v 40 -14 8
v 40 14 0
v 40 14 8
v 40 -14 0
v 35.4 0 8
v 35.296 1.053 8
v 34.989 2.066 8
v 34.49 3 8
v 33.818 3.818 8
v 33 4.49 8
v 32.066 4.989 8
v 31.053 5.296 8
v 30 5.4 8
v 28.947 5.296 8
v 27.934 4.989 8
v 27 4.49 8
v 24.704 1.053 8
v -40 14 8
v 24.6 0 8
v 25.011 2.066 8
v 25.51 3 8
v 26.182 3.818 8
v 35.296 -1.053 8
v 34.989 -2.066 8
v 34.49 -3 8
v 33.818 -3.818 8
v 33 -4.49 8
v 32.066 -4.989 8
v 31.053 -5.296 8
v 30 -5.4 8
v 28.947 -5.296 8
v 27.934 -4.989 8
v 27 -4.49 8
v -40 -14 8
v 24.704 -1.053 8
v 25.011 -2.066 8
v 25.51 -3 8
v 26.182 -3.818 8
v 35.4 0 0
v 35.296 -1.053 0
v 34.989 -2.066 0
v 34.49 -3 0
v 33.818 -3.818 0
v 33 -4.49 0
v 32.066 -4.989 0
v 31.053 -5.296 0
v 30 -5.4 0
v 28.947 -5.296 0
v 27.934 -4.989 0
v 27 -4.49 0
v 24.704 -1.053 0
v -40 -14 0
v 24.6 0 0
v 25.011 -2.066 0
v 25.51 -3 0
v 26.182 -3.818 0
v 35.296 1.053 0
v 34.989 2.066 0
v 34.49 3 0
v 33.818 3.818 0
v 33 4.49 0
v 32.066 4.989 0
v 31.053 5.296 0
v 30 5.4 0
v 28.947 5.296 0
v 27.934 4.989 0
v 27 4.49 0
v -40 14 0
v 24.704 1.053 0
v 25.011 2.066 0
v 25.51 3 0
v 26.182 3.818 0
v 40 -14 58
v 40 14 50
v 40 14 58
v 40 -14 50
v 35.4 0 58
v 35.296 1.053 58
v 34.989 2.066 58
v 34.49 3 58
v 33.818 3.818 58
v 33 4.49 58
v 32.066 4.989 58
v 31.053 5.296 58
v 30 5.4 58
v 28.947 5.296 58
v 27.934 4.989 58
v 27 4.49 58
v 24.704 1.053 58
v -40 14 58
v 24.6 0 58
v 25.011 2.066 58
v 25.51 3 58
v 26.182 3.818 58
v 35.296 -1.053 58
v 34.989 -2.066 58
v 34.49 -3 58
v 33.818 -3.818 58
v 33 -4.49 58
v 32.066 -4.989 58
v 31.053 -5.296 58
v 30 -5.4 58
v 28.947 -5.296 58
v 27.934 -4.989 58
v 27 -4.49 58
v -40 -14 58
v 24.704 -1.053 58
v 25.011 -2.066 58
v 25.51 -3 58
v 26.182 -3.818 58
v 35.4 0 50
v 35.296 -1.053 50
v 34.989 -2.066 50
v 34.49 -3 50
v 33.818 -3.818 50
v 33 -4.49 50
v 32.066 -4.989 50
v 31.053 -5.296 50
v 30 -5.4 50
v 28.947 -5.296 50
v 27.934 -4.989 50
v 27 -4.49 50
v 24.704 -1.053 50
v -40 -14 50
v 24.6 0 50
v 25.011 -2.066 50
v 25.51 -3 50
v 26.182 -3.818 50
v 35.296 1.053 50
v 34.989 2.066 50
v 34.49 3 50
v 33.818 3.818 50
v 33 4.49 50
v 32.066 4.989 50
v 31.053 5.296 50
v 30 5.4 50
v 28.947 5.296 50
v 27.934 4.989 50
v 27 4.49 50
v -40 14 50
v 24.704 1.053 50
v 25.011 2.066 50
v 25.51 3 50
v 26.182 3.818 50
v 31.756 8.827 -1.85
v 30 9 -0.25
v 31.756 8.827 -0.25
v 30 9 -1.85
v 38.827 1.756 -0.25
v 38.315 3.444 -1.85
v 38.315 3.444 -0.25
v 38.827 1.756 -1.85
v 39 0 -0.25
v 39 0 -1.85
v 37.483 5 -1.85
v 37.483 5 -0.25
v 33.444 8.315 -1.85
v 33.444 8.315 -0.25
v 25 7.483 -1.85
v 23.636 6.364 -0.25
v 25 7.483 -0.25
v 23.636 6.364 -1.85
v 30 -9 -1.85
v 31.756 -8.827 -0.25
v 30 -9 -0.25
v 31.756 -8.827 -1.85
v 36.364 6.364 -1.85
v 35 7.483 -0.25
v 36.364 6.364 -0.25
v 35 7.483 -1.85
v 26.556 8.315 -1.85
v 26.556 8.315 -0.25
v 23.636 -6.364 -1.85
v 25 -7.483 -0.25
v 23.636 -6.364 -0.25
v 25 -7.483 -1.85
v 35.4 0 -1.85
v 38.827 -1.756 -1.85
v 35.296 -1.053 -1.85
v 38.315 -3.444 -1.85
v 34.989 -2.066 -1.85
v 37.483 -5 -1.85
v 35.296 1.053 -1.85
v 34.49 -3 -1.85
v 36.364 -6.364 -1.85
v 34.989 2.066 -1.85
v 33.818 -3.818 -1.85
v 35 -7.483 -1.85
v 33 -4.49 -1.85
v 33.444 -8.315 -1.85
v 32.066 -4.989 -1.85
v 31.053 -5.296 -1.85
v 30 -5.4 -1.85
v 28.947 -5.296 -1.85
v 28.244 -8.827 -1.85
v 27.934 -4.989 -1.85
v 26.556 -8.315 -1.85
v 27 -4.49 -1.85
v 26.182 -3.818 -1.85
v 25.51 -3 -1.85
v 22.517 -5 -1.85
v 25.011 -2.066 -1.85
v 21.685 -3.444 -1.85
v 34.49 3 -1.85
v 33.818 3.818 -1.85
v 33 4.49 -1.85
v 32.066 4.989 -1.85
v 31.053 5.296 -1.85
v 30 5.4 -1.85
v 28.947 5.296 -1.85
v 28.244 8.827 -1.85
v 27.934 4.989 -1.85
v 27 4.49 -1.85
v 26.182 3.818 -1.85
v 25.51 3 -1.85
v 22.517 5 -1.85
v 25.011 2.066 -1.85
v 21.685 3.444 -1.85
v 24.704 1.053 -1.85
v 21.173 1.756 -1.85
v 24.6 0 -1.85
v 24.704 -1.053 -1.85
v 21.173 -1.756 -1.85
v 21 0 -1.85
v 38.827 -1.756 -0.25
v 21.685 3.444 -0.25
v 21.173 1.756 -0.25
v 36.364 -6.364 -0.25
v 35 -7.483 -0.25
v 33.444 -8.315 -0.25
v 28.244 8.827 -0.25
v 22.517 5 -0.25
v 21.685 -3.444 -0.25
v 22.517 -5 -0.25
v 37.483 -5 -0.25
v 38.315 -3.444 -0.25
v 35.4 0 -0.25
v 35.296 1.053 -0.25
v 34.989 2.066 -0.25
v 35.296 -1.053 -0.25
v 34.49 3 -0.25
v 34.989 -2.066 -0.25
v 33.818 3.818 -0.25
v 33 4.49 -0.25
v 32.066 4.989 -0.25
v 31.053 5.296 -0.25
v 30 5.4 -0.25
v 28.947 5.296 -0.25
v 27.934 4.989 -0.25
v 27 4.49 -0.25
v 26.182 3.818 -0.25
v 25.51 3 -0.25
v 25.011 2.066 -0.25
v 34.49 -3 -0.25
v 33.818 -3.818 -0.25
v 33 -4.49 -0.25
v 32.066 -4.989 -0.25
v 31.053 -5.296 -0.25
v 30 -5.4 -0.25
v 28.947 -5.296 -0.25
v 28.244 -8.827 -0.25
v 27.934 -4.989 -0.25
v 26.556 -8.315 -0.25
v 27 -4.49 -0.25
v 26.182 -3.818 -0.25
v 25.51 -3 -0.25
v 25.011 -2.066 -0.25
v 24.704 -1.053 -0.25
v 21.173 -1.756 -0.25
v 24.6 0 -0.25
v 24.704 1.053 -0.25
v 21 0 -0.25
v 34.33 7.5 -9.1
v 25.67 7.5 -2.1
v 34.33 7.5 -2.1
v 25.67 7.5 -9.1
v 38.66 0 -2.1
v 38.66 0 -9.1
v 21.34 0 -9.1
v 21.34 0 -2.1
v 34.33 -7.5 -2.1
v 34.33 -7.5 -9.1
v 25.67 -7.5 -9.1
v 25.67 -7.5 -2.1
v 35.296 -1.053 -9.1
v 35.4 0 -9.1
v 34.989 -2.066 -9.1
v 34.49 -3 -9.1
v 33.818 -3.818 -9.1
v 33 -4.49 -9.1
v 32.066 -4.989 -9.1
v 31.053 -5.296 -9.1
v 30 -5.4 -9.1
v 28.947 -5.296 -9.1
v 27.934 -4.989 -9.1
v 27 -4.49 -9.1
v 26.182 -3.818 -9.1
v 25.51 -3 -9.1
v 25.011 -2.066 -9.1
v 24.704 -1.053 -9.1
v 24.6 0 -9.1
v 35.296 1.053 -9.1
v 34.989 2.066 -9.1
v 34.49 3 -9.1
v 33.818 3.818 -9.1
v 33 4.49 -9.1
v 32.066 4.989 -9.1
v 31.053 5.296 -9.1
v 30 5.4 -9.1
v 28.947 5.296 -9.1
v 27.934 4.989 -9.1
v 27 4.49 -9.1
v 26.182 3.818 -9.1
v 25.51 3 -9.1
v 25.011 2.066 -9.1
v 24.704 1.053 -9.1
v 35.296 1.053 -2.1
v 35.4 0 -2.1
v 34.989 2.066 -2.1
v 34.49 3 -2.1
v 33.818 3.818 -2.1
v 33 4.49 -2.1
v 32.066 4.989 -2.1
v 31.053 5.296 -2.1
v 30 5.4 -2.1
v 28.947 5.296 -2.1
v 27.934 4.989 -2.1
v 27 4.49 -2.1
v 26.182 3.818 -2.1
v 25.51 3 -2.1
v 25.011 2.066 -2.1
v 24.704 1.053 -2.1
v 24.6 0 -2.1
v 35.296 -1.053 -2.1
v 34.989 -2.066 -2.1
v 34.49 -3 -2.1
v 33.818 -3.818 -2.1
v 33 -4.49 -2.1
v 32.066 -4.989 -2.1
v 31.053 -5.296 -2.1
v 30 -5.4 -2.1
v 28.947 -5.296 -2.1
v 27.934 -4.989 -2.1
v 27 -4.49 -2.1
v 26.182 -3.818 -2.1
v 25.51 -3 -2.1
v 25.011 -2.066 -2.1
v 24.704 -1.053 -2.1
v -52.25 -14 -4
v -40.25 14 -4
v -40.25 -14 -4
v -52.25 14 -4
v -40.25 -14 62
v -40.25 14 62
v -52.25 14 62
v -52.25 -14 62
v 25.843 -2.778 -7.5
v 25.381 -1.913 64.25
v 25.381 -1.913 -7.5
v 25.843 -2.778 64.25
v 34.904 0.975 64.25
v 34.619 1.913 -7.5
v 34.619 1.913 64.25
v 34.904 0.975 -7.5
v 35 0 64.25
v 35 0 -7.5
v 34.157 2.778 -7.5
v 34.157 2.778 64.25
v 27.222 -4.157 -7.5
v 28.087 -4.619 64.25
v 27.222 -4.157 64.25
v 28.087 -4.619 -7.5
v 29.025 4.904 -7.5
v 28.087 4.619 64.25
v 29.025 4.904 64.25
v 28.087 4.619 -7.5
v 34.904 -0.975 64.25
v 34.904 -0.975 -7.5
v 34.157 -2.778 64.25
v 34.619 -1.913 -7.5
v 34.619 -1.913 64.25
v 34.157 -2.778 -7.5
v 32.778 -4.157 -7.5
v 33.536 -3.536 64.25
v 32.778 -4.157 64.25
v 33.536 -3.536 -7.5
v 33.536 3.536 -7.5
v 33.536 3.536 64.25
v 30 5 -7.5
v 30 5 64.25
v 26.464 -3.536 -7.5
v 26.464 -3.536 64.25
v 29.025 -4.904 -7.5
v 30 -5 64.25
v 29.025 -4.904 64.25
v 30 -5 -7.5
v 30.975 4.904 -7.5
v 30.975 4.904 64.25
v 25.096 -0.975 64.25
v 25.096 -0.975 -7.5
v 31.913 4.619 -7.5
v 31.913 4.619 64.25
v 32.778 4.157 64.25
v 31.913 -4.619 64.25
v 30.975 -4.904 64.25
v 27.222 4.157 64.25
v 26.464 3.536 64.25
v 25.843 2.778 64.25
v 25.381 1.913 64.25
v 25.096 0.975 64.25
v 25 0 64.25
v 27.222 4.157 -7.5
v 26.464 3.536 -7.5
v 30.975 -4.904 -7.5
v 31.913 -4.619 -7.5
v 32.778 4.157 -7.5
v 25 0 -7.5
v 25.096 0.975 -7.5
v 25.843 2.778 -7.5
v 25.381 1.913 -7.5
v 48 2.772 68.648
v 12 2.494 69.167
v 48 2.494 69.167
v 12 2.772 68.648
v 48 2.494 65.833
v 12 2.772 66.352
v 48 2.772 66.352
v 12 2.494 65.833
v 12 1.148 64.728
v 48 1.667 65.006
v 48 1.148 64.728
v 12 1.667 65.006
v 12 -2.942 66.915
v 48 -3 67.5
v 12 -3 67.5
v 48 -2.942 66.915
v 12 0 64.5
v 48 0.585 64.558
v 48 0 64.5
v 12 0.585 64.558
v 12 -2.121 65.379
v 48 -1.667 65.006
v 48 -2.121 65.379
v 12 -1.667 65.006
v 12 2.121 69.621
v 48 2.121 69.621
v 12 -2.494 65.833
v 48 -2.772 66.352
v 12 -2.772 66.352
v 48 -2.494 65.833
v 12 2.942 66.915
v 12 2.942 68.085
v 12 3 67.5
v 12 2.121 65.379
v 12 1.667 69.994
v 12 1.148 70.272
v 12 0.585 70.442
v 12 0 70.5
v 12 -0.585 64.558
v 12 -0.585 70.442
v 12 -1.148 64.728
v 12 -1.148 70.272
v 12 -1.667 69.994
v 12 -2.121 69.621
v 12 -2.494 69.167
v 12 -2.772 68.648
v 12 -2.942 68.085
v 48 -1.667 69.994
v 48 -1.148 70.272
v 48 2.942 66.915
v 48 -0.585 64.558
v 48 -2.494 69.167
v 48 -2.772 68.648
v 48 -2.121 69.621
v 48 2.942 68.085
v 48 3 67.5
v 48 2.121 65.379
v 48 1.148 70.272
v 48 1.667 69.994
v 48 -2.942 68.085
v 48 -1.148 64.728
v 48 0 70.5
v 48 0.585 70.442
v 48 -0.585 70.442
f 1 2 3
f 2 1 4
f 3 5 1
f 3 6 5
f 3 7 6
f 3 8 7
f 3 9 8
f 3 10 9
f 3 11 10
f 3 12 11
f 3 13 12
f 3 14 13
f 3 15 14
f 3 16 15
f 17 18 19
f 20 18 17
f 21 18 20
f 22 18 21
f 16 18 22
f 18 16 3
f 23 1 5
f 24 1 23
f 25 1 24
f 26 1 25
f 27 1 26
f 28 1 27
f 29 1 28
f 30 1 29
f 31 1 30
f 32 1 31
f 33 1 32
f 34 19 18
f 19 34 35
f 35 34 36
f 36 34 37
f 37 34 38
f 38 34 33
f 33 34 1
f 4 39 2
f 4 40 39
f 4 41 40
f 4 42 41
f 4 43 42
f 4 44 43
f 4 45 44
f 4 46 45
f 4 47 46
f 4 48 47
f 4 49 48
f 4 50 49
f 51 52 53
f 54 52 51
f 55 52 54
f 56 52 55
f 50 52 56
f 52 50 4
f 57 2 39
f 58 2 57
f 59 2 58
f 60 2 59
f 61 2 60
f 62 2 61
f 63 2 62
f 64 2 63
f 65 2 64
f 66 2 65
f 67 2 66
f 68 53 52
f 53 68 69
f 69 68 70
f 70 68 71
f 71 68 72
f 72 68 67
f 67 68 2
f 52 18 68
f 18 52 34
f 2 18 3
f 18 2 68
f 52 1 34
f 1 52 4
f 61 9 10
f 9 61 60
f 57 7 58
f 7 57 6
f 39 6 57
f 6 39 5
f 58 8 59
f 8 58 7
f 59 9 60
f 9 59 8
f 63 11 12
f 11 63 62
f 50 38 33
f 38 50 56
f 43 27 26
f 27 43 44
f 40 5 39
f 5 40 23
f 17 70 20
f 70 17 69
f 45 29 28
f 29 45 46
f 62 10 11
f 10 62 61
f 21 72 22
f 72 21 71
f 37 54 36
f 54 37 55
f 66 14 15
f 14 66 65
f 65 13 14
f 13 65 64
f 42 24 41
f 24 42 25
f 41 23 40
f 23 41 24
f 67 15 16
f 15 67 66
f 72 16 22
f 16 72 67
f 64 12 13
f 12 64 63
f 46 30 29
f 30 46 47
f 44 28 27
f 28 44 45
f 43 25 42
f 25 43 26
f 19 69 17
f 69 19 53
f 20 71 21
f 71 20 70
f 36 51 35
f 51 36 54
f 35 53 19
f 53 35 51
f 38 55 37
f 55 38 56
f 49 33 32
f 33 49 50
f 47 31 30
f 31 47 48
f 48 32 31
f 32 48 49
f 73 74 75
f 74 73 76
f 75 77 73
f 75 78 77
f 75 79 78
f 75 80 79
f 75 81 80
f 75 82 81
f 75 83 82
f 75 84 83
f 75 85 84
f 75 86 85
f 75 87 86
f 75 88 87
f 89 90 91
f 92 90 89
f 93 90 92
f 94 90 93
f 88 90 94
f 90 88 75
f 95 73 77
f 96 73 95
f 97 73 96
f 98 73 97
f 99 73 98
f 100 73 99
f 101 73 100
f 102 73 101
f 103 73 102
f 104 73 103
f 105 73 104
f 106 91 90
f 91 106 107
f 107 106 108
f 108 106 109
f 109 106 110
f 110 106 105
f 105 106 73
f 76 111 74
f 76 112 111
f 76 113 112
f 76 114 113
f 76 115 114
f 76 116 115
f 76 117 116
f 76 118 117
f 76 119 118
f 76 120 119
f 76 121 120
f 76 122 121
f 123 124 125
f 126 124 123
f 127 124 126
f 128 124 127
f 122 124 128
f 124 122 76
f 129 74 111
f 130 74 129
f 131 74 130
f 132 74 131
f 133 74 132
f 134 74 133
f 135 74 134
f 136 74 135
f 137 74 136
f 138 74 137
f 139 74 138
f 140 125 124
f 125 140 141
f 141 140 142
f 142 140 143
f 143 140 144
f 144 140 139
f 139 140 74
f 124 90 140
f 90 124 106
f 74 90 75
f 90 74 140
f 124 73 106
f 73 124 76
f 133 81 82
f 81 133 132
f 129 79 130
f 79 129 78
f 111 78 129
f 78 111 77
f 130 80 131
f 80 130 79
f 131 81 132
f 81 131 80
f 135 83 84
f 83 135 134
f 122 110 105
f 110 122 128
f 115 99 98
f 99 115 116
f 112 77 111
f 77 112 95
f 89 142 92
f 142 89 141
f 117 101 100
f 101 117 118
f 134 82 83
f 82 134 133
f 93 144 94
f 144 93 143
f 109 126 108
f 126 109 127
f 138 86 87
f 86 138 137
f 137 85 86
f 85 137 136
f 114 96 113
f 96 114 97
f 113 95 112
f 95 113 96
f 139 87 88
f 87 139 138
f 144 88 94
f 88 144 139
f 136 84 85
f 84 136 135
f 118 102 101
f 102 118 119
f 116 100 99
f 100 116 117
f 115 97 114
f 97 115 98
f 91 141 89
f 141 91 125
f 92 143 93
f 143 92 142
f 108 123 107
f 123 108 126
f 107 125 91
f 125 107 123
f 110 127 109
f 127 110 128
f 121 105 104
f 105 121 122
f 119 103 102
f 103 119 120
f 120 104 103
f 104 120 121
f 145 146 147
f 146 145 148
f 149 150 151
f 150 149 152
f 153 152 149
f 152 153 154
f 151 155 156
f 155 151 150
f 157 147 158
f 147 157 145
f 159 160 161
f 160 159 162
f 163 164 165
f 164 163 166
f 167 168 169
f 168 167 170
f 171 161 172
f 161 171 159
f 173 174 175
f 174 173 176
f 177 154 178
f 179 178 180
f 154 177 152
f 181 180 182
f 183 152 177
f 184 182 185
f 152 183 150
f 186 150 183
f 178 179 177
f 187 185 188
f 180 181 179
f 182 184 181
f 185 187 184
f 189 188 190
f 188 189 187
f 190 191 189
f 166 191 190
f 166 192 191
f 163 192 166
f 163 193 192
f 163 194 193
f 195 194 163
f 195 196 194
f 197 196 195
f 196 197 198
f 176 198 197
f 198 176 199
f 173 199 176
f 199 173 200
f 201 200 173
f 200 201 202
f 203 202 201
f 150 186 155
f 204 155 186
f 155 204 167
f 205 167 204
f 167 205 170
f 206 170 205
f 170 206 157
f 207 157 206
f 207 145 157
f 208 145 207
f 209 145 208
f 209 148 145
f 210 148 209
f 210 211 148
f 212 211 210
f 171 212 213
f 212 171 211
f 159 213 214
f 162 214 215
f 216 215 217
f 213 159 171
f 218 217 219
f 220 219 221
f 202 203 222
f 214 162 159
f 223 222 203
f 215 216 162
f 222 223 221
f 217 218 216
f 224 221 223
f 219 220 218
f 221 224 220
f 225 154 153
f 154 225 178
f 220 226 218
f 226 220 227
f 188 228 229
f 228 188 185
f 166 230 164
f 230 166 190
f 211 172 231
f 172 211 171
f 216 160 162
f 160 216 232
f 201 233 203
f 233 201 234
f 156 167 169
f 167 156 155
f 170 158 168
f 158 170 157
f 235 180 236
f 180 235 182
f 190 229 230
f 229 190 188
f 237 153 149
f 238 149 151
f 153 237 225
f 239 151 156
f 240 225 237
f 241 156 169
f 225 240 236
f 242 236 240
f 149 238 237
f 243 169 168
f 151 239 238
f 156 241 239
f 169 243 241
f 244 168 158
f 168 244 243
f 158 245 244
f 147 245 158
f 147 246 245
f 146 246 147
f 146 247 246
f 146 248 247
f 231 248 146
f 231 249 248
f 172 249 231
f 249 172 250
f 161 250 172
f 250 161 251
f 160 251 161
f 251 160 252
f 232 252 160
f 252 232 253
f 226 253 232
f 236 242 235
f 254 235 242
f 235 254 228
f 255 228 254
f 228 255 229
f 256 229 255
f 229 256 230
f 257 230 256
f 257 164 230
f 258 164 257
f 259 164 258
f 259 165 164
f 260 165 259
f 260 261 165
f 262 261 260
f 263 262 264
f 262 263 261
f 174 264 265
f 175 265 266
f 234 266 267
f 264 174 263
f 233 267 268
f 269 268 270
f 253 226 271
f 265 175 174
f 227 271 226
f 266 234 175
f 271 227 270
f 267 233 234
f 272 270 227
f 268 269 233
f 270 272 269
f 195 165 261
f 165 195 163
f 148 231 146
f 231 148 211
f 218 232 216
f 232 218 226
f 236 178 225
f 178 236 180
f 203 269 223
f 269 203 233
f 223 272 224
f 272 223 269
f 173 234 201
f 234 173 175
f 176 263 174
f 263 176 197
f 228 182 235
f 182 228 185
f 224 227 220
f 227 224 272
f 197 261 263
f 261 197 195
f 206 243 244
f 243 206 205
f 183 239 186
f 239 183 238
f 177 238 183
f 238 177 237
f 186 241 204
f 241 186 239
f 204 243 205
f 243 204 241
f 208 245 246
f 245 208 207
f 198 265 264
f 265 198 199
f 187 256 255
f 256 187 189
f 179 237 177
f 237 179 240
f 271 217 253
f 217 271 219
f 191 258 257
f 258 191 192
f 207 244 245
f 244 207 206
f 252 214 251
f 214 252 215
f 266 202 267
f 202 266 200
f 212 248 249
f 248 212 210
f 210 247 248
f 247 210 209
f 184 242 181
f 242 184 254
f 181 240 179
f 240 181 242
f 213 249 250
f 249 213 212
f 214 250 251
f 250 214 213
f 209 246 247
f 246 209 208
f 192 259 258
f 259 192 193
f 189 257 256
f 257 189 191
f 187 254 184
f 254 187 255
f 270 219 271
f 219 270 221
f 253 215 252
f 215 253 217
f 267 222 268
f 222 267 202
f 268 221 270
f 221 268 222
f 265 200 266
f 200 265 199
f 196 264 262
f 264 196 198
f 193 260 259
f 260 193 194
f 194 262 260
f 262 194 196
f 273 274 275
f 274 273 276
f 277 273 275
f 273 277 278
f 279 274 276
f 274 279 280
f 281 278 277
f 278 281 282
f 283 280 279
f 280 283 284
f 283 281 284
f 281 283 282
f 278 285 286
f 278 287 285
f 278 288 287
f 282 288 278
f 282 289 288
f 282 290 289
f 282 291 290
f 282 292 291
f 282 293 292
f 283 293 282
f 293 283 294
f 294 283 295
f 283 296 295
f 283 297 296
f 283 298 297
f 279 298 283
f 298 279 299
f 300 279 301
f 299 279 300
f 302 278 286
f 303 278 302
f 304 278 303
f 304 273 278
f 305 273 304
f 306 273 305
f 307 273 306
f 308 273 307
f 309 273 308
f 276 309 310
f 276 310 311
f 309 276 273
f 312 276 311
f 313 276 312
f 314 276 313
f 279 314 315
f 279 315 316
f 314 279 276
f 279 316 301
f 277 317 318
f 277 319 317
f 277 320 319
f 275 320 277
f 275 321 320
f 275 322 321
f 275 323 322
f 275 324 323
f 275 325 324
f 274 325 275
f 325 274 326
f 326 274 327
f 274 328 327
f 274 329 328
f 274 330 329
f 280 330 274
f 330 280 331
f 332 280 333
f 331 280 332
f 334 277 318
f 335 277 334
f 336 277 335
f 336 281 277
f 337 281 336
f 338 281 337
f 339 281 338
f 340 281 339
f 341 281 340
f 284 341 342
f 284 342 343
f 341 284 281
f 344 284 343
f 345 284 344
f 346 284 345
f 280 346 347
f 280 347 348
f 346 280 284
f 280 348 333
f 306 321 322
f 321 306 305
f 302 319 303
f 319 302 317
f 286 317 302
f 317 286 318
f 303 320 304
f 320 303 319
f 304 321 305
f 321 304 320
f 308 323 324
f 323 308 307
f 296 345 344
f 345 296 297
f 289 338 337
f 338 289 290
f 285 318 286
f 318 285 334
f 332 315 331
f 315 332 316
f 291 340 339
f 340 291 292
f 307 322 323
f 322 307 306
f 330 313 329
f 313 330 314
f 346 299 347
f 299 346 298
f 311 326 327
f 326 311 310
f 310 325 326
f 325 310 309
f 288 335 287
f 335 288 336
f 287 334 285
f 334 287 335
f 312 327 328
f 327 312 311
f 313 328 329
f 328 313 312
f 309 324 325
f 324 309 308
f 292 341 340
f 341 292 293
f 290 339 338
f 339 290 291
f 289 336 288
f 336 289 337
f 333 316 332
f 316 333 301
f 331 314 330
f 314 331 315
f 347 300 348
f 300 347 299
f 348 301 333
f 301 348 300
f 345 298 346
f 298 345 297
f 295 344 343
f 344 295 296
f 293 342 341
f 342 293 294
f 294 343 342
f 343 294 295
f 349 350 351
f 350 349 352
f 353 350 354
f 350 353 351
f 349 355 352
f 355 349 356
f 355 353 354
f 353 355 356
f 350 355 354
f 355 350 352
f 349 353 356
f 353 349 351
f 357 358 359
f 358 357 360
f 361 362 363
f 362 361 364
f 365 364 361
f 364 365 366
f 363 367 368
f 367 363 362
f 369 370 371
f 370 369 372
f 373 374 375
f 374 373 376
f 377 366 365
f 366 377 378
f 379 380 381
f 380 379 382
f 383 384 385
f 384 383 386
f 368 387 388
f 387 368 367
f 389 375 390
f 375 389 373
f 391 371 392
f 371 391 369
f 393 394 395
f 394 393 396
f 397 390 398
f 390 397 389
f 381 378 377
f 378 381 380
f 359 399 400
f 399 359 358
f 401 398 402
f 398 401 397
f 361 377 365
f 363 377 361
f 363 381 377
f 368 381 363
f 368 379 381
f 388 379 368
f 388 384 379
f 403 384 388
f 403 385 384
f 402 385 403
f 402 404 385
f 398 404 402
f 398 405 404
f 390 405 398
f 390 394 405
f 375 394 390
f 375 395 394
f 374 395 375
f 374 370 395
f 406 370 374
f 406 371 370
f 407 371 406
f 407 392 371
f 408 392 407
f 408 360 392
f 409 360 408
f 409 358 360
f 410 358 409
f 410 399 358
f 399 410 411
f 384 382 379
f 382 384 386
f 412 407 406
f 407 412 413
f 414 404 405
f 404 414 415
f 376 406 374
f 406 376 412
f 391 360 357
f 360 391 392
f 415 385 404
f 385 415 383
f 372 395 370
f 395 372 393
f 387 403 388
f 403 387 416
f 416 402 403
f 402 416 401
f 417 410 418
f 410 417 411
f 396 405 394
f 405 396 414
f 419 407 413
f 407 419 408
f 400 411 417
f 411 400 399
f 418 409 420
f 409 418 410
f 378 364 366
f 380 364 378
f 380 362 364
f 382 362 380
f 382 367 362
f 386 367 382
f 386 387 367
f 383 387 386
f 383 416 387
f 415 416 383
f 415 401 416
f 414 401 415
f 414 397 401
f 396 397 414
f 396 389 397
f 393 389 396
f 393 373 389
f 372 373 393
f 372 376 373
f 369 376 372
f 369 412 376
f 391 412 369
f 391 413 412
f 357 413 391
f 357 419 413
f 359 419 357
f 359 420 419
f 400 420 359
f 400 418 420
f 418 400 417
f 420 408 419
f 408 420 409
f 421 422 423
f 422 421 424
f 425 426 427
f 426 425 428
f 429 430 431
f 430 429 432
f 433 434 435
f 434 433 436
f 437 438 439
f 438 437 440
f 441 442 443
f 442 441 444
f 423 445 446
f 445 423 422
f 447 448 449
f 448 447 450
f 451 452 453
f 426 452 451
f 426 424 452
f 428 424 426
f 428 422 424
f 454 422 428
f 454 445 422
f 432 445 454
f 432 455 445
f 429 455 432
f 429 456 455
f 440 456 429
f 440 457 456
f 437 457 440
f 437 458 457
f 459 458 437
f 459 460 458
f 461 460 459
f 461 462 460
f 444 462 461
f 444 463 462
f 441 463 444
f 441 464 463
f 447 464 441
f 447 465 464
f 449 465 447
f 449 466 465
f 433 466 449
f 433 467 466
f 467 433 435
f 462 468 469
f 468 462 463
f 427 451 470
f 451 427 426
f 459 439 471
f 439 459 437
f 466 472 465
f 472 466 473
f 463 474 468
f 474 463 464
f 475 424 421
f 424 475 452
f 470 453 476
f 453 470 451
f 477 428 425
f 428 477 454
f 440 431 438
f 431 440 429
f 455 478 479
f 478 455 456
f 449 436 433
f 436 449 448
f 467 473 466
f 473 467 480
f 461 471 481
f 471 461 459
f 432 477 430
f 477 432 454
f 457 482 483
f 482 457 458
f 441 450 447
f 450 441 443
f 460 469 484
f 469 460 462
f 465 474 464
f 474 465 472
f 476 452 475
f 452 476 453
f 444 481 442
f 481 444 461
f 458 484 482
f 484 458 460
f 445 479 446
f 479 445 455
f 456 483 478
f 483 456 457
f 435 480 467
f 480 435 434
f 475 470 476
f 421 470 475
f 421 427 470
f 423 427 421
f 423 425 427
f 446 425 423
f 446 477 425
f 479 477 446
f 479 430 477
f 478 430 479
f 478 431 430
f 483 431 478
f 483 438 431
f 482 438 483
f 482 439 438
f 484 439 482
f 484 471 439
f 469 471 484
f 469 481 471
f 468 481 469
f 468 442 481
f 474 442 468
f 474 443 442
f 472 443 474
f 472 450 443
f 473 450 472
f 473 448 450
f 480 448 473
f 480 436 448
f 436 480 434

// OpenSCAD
$fn = 32;

// ------------------------------------------------------------------------
// C clamp: throat 50 mm, screw d10
// Every part is its own module, assembly() places every instance.
// ------------------------------------------------------------------------

// --- part 1 ---
module clamp_arm() {
  difference() {
    translate([-40, -14, 0]) cube([80, 28, 8]);
    translate([30, 0, -1]) cylinder(h = 10, d = 10.8);
  }
}

// --- part 2 ---
module clamp_spine() {
  difference() {
    translate([-33, -14, 0]) cube([66, 28, 12]);
  }
}

// --- part 3 ---
module clamp_screw() {
  translate([0, 0, -35.875]) cylinder(h = 71.75, d = 10);
}

// --- part 4 ---
module clamp_washer() {
  difference() {
      translate([0, 0, 0]) cylinder(h = 1.6, d = 18);
      translate([0, 0, -1]) cylinder(h = 3.6, d = 10.8);
    }
}

// --- part 5 ---
module clamp_nut() {
  difference() {
    linear_extrude(height = 7) polygon(points = [[8.66, 0], [4.33, 7.5], [-4.33, 7.5], [-8.66, 0], [-4.33, -7.5], [4.33, -7.5]]);
    translate([0, 0, -1]) cylinder(h = 9, d = 10.8);
  }
}

// --- part 6 ---
module tommy_bar() {
  translate([0, 0, -18]) cylinder(h = 36, d = 6);
}

// --- assembly ---
module assembly() {
  color([0.80, 0.24, 0.20]) translate([0, 0, 0]) rotate([0, 0, 0]) clamp_arm();
  color([0.20, 0.45, 0.75]) translate([0, 0, 50]) rotate([0, 0, 0]) clamp_arm();
  color([0.25, 0.62, 0.32]) translate([-52.25, 0, 29]) rotate([0, 90, 0]) clamp_spine();
  color([0.92, 0.70, 0.18]) translate([30, 0, 28.375]) rotate([0, 0, 0]) clamp_screw();
  color([0.58, 0.35, 0.70]) translate([30, 0, -1.85]) rotate([0, 0, 0]) clamp_washer();
  color([0.16, 0.66, 0.66]) translate([30, 0, -9.1]) rotate([0, 0, 0]) clamp_nut();
  color([0.85, 0.48, 0.18]) translate([30, 0, 67.5]) rotate([0, 90, 0]) tommy_bar();
}

assembly();
